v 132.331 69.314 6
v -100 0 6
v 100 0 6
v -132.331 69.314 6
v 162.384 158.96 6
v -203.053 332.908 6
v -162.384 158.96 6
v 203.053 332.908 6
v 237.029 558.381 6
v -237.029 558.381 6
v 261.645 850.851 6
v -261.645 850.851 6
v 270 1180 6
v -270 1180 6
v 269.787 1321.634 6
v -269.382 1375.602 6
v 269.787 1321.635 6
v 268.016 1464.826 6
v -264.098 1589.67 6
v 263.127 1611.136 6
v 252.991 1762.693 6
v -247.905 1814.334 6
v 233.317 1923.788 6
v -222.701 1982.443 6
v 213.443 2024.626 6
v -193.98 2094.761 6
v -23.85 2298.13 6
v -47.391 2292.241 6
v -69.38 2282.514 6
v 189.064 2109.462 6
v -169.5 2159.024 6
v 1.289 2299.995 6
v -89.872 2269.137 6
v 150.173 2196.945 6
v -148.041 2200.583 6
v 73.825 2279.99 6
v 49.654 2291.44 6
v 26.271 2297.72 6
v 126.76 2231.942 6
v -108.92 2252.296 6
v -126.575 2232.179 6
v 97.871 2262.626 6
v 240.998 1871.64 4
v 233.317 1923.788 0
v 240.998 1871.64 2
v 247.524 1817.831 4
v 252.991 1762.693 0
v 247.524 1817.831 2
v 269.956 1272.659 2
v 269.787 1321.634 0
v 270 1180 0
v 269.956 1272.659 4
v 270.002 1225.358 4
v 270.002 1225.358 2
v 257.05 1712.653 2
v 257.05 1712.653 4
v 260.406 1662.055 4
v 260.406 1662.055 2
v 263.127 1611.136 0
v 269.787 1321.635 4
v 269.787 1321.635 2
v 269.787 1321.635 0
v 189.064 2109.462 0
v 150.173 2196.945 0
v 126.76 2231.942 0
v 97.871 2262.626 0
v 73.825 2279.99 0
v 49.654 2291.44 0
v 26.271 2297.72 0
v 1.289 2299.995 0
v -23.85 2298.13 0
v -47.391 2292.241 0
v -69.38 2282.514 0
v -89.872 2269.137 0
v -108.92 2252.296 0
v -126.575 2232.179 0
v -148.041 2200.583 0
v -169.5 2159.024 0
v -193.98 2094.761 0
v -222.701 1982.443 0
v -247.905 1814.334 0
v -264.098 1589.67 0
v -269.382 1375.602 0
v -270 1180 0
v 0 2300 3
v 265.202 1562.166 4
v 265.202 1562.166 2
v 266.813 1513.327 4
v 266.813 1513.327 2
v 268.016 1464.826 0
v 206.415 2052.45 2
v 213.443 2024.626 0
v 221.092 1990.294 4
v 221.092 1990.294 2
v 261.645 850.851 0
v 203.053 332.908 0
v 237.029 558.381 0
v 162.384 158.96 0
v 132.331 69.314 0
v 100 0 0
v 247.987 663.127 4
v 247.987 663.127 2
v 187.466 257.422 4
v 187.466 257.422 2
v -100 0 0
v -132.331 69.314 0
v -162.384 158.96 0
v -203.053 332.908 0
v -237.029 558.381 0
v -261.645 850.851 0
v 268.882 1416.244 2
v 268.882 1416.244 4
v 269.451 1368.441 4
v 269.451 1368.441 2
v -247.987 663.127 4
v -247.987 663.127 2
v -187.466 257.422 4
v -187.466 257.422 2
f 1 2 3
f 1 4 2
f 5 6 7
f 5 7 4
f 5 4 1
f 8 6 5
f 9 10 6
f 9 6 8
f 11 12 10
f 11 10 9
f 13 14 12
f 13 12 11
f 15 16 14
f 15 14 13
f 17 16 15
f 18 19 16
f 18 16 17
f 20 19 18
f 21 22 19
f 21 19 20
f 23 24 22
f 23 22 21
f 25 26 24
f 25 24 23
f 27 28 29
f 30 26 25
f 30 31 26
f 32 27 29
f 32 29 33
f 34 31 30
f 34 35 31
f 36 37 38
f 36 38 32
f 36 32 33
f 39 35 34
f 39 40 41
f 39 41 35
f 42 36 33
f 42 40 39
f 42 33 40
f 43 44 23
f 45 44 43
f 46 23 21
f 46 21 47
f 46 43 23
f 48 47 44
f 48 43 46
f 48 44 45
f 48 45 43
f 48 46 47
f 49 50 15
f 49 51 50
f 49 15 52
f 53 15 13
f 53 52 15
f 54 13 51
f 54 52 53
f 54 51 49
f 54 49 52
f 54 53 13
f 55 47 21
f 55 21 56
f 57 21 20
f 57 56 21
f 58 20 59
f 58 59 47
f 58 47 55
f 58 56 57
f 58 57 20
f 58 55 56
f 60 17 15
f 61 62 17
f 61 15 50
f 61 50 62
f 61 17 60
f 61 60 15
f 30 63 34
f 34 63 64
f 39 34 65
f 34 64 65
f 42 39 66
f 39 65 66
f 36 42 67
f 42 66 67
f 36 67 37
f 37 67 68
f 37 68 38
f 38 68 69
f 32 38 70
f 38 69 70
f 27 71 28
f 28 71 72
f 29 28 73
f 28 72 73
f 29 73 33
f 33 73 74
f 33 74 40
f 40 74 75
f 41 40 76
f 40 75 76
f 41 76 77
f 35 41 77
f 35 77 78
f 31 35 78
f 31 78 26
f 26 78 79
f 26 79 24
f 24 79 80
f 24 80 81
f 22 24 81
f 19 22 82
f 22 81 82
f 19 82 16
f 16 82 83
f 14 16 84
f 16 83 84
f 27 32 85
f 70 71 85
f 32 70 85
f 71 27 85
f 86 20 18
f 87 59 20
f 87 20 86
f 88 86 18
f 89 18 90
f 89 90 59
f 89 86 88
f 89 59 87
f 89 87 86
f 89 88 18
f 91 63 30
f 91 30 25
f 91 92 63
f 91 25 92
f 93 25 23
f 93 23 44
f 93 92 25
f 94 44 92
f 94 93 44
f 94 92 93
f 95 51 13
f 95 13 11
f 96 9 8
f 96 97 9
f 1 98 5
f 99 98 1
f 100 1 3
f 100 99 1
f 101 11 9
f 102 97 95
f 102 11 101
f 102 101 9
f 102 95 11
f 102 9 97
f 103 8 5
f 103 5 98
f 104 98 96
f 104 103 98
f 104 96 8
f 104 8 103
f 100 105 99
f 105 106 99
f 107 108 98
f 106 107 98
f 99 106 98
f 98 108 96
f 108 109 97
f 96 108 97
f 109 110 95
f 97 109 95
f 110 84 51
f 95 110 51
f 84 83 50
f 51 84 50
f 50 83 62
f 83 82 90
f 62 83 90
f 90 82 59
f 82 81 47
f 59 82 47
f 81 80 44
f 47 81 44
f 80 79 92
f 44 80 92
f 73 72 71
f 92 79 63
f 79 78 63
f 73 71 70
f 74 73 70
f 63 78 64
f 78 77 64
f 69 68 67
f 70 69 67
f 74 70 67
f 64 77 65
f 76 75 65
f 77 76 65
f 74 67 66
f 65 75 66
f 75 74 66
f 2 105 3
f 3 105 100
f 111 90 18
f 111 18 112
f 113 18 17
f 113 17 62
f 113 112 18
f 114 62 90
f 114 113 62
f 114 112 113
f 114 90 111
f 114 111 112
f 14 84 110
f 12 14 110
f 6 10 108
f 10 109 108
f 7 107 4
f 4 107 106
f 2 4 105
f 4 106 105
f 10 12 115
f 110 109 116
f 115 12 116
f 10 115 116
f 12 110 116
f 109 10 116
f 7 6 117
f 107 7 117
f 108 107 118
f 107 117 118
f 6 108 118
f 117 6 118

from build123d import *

# Parameters (mm, degrees)
F2_DEPTH = 6


with BuildPart() as f2:
    # F1 (on Top) → F2 (new body)
    with BuildSketch(Plane.XY):
        with BuildLine():
            Line((-100, 0), (0, 0))
            Line((0, 0), (100, 0))
            add(Edge.make_bspline(
                [(270, 1180), (271.095663, 619.914591), (197.083816, 170.90939), (100, 0)],
                knots=[0, 0, 0, 0, 1192.182872, 1192.182872, 1192.182872, 1192.182872], degree=3))
            add(Edge.make_bspline(
                [(269.786568, 1321.634432), (270.04327, 1271.912263), (270, 1224.295649), (270, 1180)],
                knots=[1028.984842, 1028.984842, 1028.984842, 1028.984842, 1152.085066, 1152.085066, 1152.085066, 1152.085066], degree=3))
            add(Edge.make_bspline(
                [(269.786566, 1321.63479), (269.786567, 1321.634671), (269.786568, 1321.634551), (269.786568, 1321.634432)],
                knots=[1028.984547, 1028.984547, 1028.984547, 1028.984547, 1028.984842, 1028.984842, 1028.984842, 1028.984842], degree=3))
            add(Edge.make_bspline(
                [(268.016351, 1464.825649), (269.049785, 1415.926246), (269.547864, 1367.870216), (269.786566, 1321.63479)],
                knots=[914.51669, 914.51669, 914.51669, 914.51669, 1028.984547, 1028.984547, 1028.984547, 1028.984547], degree=3))
            add(Edge.make_bspline(
                [(263.126685, 1611.136315), (265.454943, 1562.170903), (266.99639, 1513.087513), (268.016351, 1464.825649)],
                knots=[801.541241, 801.541241, 801.541241, 801.541241, 914.51669, 914.51669, 914.51669, 914.51669], degree=3))
            add(Edge.make_bspline(
                [(252.991035, 1762.692965), (257.423034, 1713.009801), (260.70165, 1662.137052), (263.126685, 1611.136315)],
                knots=[683.86979, 683.86979, 683.86979, 683.86979, 801.541241, 801.541241, 801.541241, 801.541241], degree=3))
            add(Edge.make_bspline(
                [(233.317277, 1923.787723), (241.605907, 1872.580953), (248.023075, 1818.384306), (252.991035, 1762.692965)],
                knots=[551.968347, 551.968347, 551.968347, 551.968347, 683.86979, 683.86979, 683.86979, 683.86979], degree=3))
            add(Edge.make_bspline(
                [(189.06399, 2109.46201), (207.827413, 2055.285576), (222.242791, 1992.205382), (233.317277, 1923.787723)],
                knots=[375.734072, 375.734072, 375.734072, 375.734072, 551.968347, 551.968347, 551.968347, 551.968347], degree=3))
            add(Edge.make_bspline(
                [(0, 2300), (89.292219, 2300), (149.060096, 2224.966966), (189.06399, 2109.46201)],
                knots=[0, 0, 0, 0, 375.734072, 375.734072, 375.734072, 375.734072], degree=3))
            add(Edge.make_bspline(
                [(0, 2300), (-273.790002, 2300), (-270, 1594.559409), (-270, 1180)],
                knots=[0, 0, 0, 0, 1152.085066, 1152.085066, 1152.085066, 1152.085066], degree=3))
            add(Edge.make_bspline(
                [(-270, 1180), (-271.095663, 619.914591), (-197.083816, 170.90939), (-100, 0)],
                knots=[0, 0, 0, 0, 1192.182872, 1192.182872, 1192.182872, 1192.182872], degree=3))
        make_face()
    extrude(amount=F2_DEPTH)


solid = f2.part
